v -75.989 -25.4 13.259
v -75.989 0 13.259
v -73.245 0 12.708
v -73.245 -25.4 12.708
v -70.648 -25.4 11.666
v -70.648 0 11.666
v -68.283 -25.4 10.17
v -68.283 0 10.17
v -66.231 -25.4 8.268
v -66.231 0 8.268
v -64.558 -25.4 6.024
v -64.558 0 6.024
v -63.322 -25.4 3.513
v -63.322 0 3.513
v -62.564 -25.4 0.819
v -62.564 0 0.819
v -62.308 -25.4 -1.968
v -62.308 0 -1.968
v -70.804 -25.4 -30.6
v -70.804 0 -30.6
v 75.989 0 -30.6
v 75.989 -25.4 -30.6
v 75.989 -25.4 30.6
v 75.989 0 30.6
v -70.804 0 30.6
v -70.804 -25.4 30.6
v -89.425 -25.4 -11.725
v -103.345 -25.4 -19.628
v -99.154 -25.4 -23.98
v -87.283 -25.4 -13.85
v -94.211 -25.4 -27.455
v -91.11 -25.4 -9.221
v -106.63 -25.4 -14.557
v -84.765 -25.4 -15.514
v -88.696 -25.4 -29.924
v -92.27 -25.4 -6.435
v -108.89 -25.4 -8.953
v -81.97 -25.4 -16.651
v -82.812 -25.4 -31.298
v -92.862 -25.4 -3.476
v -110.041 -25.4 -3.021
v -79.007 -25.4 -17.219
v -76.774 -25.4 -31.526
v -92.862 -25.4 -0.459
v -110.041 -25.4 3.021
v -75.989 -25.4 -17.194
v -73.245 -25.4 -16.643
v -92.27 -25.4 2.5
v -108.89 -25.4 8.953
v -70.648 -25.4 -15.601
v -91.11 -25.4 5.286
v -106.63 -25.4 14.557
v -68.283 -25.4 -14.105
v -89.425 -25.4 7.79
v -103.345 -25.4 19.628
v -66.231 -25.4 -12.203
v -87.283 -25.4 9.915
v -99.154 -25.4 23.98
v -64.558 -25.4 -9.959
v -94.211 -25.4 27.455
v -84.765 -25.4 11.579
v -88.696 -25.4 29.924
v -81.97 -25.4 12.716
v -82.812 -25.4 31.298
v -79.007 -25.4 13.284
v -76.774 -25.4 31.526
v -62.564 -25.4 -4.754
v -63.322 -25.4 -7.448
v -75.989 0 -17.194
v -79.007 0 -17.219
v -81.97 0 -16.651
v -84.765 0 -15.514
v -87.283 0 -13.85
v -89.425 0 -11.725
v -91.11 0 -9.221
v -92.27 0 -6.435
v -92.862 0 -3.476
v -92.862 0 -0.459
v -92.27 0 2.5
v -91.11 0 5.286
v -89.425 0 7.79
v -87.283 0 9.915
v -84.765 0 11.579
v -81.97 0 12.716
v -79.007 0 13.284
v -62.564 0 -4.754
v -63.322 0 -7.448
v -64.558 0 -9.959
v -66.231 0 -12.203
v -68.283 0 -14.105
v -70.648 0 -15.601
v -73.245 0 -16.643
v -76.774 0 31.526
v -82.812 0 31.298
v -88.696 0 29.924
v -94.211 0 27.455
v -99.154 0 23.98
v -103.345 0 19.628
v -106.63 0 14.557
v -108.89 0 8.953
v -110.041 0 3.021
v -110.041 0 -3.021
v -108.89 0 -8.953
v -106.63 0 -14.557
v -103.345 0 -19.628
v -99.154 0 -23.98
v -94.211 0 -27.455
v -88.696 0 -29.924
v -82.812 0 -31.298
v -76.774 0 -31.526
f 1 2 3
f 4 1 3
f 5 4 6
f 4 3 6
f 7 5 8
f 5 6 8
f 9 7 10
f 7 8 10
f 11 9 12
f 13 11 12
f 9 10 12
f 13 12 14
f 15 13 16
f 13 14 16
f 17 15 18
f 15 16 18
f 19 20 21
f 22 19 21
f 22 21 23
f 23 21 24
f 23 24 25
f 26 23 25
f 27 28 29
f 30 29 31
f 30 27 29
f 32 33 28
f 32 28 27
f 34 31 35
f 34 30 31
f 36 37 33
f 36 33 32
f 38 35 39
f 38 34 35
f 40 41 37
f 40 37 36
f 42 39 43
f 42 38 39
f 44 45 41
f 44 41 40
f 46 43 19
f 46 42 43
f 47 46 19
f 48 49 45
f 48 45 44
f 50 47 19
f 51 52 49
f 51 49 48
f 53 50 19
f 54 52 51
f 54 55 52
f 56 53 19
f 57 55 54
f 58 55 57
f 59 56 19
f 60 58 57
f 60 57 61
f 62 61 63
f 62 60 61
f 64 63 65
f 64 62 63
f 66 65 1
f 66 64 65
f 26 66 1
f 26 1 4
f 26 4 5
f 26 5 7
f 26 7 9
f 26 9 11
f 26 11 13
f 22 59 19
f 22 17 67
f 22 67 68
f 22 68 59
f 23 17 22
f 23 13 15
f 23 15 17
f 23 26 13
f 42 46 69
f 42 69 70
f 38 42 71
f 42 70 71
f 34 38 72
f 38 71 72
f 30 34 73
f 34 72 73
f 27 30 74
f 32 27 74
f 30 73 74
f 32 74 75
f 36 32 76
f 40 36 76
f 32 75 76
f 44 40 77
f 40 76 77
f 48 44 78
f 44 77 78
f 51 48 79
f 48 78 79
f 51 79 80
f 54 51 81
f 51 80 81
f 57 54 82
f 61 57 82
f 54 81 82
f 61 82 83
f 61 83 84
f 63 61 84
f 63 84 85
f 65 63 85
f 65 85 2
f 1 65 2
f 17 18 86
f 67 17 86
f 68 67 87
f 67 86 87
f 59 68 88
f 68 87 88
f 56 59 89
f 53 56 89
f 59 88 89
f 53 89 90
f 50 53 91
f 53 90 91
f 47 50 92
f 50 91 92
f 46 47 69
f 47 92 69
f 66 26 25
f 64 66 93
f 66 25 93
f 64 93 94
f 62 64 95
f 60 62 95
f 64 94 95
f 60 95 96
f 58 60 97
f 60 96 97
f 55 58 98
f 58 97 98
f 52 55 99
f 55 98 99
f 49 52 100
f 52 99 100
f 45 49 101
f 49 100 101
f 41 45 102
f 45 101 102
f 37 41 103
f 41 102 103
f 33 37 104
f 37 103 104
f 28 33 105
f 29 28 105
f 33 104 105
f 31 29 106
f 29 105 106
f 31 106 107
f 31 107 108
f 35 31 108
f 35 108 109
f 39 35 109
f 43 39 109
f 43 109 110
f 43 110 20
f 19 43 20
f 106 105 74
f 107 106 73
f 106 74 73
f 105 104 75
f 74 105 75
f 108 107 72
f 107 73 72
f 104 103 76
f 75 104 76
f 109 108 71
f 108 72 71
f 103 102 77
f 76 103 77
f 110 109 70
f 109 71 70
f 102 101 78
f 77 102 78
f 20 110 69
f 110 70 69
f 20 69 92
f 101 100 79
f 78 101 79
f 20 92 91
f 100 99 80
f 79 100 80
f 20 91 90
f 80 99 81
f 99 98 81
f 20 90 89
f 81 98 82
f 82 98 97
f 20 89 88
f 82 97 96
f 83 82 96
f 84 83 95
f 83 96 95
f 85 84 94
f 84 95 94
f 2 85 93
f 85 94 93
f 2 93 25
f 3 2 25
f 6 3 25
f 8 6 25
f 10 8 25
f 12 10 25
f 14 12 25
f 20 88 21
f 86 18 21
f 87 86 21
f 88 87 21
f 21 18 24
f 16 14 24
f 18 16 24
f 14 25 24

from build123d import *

# Parameters (mm, degrees)
F1_DEPTH = 25.4
F3_DEPTH = 25.4


# Not quite as in the source:
# - a feature names something its author has since deleted; it is built from what else it names


with BuildPart() as f1:
    # F0 (on Front) → F1 (new body)
    with BuildSketch(Plane.XZ):
        with BuildLine():
            Line((75.9890973568, -30.600361526), (75.9890973568, 30.600361526))
            Line((75.9890973568, 30.600361526), (-70.8035532623, 30.600361526))
            ThreePointArc((-70.8035532623, 30.600361526), (-53.6695268316, 19.3760533103), (-47.026597149, 0))
            ThreePointArc((-47.026597149, 0), (-53.6695268316, -19.3760533103), (-70.8035532623, -30.600361526))
            Line((-70.8035532623, -30.600361526), (75.9890973568, -30.600361526))
        make_face()
    extrude(amount=F1_DEPTH)

    # F0 (on Front) → F3 (join)
    with BuildSketch(Plane.XZ):
        with BuildLine():
            Line((75.9890973568, -30.600361526), (75.9890973568, 30.600361526))
            Line((75.9890973568, 30.600361526), (-70.8035532623, 30.600361526))
            ThreePointArc((-70.8035532623, 30.600361526), (-53.6695268316, 19.3760533103), (-47.026597149, 0))
            ThreePointArc((-47.026597149, 0), (-53.6695268316, -19.3760533103), (-70.8035532623, -30.600361526))
            Line((-70.8035532623, -30.600361526), (75.9890973568, -30.600361526))
        make_face()
        with BuildLine():
            ThreePointArc((-47.026597149, 0), (-53.6695268316, 19.3760533103), (-70.8035532623, 30.600361526))
            Line((-70.8035532623, 30.600361526), (-75.9890973568, 30.600361526))
            Line((-75.9890973568, 30.600361526), (-75.9890973568, 13.2593563534))
            ThreePointArc((-75.9890973568, 13.2593563534), (-66.2306105471, 8.26762835), (-62.3079244328, -1.9675046206))
            ThreePointArc((-62.3079244328, -1.9675046206), (-66.2306105471, -12.2026375911), (-75.9890973568, -17.1943655945))
            Line((-75.9890973568, -17.1943655945), (-75.9890973568, -30.600361526))
            Line((-75.9890973568, -30.600361526), (-70.8035532623, -30.600361526))
            ThreePointArc((-70.8035532623, -30.600361526), (-53.6695268316, -19.3760533103), (-47.026597149, 0))
        make_face()
        with BuildLine():
            Line((-75.9890973568, 30.600361526), (-70.8035532623, 30.600361526))
            ThreePointArc((-70.8035532623, 30.600361526), (-110.1854708241, 0), (-70.8035532623, -30.600361526))
            Line((-70.8035532623, -30.600361526), (-75.9890973568, -30.600361526))
            Line((-75.9890973568, -30.600361526), (-75.9890973568, -17.1943655945))
            ThreePointArc((-75.9890973568, -17.1943655945), (-92.9362769889, -1.9675046206), (-75.9890973568, 13.2593563534))
            Line((-75.9890973568, 13.2593563534), (-75.9890973568, 30.600361526))
        make_face()
    extrude(amount=F3_DEPTH)


solid = f1.part
